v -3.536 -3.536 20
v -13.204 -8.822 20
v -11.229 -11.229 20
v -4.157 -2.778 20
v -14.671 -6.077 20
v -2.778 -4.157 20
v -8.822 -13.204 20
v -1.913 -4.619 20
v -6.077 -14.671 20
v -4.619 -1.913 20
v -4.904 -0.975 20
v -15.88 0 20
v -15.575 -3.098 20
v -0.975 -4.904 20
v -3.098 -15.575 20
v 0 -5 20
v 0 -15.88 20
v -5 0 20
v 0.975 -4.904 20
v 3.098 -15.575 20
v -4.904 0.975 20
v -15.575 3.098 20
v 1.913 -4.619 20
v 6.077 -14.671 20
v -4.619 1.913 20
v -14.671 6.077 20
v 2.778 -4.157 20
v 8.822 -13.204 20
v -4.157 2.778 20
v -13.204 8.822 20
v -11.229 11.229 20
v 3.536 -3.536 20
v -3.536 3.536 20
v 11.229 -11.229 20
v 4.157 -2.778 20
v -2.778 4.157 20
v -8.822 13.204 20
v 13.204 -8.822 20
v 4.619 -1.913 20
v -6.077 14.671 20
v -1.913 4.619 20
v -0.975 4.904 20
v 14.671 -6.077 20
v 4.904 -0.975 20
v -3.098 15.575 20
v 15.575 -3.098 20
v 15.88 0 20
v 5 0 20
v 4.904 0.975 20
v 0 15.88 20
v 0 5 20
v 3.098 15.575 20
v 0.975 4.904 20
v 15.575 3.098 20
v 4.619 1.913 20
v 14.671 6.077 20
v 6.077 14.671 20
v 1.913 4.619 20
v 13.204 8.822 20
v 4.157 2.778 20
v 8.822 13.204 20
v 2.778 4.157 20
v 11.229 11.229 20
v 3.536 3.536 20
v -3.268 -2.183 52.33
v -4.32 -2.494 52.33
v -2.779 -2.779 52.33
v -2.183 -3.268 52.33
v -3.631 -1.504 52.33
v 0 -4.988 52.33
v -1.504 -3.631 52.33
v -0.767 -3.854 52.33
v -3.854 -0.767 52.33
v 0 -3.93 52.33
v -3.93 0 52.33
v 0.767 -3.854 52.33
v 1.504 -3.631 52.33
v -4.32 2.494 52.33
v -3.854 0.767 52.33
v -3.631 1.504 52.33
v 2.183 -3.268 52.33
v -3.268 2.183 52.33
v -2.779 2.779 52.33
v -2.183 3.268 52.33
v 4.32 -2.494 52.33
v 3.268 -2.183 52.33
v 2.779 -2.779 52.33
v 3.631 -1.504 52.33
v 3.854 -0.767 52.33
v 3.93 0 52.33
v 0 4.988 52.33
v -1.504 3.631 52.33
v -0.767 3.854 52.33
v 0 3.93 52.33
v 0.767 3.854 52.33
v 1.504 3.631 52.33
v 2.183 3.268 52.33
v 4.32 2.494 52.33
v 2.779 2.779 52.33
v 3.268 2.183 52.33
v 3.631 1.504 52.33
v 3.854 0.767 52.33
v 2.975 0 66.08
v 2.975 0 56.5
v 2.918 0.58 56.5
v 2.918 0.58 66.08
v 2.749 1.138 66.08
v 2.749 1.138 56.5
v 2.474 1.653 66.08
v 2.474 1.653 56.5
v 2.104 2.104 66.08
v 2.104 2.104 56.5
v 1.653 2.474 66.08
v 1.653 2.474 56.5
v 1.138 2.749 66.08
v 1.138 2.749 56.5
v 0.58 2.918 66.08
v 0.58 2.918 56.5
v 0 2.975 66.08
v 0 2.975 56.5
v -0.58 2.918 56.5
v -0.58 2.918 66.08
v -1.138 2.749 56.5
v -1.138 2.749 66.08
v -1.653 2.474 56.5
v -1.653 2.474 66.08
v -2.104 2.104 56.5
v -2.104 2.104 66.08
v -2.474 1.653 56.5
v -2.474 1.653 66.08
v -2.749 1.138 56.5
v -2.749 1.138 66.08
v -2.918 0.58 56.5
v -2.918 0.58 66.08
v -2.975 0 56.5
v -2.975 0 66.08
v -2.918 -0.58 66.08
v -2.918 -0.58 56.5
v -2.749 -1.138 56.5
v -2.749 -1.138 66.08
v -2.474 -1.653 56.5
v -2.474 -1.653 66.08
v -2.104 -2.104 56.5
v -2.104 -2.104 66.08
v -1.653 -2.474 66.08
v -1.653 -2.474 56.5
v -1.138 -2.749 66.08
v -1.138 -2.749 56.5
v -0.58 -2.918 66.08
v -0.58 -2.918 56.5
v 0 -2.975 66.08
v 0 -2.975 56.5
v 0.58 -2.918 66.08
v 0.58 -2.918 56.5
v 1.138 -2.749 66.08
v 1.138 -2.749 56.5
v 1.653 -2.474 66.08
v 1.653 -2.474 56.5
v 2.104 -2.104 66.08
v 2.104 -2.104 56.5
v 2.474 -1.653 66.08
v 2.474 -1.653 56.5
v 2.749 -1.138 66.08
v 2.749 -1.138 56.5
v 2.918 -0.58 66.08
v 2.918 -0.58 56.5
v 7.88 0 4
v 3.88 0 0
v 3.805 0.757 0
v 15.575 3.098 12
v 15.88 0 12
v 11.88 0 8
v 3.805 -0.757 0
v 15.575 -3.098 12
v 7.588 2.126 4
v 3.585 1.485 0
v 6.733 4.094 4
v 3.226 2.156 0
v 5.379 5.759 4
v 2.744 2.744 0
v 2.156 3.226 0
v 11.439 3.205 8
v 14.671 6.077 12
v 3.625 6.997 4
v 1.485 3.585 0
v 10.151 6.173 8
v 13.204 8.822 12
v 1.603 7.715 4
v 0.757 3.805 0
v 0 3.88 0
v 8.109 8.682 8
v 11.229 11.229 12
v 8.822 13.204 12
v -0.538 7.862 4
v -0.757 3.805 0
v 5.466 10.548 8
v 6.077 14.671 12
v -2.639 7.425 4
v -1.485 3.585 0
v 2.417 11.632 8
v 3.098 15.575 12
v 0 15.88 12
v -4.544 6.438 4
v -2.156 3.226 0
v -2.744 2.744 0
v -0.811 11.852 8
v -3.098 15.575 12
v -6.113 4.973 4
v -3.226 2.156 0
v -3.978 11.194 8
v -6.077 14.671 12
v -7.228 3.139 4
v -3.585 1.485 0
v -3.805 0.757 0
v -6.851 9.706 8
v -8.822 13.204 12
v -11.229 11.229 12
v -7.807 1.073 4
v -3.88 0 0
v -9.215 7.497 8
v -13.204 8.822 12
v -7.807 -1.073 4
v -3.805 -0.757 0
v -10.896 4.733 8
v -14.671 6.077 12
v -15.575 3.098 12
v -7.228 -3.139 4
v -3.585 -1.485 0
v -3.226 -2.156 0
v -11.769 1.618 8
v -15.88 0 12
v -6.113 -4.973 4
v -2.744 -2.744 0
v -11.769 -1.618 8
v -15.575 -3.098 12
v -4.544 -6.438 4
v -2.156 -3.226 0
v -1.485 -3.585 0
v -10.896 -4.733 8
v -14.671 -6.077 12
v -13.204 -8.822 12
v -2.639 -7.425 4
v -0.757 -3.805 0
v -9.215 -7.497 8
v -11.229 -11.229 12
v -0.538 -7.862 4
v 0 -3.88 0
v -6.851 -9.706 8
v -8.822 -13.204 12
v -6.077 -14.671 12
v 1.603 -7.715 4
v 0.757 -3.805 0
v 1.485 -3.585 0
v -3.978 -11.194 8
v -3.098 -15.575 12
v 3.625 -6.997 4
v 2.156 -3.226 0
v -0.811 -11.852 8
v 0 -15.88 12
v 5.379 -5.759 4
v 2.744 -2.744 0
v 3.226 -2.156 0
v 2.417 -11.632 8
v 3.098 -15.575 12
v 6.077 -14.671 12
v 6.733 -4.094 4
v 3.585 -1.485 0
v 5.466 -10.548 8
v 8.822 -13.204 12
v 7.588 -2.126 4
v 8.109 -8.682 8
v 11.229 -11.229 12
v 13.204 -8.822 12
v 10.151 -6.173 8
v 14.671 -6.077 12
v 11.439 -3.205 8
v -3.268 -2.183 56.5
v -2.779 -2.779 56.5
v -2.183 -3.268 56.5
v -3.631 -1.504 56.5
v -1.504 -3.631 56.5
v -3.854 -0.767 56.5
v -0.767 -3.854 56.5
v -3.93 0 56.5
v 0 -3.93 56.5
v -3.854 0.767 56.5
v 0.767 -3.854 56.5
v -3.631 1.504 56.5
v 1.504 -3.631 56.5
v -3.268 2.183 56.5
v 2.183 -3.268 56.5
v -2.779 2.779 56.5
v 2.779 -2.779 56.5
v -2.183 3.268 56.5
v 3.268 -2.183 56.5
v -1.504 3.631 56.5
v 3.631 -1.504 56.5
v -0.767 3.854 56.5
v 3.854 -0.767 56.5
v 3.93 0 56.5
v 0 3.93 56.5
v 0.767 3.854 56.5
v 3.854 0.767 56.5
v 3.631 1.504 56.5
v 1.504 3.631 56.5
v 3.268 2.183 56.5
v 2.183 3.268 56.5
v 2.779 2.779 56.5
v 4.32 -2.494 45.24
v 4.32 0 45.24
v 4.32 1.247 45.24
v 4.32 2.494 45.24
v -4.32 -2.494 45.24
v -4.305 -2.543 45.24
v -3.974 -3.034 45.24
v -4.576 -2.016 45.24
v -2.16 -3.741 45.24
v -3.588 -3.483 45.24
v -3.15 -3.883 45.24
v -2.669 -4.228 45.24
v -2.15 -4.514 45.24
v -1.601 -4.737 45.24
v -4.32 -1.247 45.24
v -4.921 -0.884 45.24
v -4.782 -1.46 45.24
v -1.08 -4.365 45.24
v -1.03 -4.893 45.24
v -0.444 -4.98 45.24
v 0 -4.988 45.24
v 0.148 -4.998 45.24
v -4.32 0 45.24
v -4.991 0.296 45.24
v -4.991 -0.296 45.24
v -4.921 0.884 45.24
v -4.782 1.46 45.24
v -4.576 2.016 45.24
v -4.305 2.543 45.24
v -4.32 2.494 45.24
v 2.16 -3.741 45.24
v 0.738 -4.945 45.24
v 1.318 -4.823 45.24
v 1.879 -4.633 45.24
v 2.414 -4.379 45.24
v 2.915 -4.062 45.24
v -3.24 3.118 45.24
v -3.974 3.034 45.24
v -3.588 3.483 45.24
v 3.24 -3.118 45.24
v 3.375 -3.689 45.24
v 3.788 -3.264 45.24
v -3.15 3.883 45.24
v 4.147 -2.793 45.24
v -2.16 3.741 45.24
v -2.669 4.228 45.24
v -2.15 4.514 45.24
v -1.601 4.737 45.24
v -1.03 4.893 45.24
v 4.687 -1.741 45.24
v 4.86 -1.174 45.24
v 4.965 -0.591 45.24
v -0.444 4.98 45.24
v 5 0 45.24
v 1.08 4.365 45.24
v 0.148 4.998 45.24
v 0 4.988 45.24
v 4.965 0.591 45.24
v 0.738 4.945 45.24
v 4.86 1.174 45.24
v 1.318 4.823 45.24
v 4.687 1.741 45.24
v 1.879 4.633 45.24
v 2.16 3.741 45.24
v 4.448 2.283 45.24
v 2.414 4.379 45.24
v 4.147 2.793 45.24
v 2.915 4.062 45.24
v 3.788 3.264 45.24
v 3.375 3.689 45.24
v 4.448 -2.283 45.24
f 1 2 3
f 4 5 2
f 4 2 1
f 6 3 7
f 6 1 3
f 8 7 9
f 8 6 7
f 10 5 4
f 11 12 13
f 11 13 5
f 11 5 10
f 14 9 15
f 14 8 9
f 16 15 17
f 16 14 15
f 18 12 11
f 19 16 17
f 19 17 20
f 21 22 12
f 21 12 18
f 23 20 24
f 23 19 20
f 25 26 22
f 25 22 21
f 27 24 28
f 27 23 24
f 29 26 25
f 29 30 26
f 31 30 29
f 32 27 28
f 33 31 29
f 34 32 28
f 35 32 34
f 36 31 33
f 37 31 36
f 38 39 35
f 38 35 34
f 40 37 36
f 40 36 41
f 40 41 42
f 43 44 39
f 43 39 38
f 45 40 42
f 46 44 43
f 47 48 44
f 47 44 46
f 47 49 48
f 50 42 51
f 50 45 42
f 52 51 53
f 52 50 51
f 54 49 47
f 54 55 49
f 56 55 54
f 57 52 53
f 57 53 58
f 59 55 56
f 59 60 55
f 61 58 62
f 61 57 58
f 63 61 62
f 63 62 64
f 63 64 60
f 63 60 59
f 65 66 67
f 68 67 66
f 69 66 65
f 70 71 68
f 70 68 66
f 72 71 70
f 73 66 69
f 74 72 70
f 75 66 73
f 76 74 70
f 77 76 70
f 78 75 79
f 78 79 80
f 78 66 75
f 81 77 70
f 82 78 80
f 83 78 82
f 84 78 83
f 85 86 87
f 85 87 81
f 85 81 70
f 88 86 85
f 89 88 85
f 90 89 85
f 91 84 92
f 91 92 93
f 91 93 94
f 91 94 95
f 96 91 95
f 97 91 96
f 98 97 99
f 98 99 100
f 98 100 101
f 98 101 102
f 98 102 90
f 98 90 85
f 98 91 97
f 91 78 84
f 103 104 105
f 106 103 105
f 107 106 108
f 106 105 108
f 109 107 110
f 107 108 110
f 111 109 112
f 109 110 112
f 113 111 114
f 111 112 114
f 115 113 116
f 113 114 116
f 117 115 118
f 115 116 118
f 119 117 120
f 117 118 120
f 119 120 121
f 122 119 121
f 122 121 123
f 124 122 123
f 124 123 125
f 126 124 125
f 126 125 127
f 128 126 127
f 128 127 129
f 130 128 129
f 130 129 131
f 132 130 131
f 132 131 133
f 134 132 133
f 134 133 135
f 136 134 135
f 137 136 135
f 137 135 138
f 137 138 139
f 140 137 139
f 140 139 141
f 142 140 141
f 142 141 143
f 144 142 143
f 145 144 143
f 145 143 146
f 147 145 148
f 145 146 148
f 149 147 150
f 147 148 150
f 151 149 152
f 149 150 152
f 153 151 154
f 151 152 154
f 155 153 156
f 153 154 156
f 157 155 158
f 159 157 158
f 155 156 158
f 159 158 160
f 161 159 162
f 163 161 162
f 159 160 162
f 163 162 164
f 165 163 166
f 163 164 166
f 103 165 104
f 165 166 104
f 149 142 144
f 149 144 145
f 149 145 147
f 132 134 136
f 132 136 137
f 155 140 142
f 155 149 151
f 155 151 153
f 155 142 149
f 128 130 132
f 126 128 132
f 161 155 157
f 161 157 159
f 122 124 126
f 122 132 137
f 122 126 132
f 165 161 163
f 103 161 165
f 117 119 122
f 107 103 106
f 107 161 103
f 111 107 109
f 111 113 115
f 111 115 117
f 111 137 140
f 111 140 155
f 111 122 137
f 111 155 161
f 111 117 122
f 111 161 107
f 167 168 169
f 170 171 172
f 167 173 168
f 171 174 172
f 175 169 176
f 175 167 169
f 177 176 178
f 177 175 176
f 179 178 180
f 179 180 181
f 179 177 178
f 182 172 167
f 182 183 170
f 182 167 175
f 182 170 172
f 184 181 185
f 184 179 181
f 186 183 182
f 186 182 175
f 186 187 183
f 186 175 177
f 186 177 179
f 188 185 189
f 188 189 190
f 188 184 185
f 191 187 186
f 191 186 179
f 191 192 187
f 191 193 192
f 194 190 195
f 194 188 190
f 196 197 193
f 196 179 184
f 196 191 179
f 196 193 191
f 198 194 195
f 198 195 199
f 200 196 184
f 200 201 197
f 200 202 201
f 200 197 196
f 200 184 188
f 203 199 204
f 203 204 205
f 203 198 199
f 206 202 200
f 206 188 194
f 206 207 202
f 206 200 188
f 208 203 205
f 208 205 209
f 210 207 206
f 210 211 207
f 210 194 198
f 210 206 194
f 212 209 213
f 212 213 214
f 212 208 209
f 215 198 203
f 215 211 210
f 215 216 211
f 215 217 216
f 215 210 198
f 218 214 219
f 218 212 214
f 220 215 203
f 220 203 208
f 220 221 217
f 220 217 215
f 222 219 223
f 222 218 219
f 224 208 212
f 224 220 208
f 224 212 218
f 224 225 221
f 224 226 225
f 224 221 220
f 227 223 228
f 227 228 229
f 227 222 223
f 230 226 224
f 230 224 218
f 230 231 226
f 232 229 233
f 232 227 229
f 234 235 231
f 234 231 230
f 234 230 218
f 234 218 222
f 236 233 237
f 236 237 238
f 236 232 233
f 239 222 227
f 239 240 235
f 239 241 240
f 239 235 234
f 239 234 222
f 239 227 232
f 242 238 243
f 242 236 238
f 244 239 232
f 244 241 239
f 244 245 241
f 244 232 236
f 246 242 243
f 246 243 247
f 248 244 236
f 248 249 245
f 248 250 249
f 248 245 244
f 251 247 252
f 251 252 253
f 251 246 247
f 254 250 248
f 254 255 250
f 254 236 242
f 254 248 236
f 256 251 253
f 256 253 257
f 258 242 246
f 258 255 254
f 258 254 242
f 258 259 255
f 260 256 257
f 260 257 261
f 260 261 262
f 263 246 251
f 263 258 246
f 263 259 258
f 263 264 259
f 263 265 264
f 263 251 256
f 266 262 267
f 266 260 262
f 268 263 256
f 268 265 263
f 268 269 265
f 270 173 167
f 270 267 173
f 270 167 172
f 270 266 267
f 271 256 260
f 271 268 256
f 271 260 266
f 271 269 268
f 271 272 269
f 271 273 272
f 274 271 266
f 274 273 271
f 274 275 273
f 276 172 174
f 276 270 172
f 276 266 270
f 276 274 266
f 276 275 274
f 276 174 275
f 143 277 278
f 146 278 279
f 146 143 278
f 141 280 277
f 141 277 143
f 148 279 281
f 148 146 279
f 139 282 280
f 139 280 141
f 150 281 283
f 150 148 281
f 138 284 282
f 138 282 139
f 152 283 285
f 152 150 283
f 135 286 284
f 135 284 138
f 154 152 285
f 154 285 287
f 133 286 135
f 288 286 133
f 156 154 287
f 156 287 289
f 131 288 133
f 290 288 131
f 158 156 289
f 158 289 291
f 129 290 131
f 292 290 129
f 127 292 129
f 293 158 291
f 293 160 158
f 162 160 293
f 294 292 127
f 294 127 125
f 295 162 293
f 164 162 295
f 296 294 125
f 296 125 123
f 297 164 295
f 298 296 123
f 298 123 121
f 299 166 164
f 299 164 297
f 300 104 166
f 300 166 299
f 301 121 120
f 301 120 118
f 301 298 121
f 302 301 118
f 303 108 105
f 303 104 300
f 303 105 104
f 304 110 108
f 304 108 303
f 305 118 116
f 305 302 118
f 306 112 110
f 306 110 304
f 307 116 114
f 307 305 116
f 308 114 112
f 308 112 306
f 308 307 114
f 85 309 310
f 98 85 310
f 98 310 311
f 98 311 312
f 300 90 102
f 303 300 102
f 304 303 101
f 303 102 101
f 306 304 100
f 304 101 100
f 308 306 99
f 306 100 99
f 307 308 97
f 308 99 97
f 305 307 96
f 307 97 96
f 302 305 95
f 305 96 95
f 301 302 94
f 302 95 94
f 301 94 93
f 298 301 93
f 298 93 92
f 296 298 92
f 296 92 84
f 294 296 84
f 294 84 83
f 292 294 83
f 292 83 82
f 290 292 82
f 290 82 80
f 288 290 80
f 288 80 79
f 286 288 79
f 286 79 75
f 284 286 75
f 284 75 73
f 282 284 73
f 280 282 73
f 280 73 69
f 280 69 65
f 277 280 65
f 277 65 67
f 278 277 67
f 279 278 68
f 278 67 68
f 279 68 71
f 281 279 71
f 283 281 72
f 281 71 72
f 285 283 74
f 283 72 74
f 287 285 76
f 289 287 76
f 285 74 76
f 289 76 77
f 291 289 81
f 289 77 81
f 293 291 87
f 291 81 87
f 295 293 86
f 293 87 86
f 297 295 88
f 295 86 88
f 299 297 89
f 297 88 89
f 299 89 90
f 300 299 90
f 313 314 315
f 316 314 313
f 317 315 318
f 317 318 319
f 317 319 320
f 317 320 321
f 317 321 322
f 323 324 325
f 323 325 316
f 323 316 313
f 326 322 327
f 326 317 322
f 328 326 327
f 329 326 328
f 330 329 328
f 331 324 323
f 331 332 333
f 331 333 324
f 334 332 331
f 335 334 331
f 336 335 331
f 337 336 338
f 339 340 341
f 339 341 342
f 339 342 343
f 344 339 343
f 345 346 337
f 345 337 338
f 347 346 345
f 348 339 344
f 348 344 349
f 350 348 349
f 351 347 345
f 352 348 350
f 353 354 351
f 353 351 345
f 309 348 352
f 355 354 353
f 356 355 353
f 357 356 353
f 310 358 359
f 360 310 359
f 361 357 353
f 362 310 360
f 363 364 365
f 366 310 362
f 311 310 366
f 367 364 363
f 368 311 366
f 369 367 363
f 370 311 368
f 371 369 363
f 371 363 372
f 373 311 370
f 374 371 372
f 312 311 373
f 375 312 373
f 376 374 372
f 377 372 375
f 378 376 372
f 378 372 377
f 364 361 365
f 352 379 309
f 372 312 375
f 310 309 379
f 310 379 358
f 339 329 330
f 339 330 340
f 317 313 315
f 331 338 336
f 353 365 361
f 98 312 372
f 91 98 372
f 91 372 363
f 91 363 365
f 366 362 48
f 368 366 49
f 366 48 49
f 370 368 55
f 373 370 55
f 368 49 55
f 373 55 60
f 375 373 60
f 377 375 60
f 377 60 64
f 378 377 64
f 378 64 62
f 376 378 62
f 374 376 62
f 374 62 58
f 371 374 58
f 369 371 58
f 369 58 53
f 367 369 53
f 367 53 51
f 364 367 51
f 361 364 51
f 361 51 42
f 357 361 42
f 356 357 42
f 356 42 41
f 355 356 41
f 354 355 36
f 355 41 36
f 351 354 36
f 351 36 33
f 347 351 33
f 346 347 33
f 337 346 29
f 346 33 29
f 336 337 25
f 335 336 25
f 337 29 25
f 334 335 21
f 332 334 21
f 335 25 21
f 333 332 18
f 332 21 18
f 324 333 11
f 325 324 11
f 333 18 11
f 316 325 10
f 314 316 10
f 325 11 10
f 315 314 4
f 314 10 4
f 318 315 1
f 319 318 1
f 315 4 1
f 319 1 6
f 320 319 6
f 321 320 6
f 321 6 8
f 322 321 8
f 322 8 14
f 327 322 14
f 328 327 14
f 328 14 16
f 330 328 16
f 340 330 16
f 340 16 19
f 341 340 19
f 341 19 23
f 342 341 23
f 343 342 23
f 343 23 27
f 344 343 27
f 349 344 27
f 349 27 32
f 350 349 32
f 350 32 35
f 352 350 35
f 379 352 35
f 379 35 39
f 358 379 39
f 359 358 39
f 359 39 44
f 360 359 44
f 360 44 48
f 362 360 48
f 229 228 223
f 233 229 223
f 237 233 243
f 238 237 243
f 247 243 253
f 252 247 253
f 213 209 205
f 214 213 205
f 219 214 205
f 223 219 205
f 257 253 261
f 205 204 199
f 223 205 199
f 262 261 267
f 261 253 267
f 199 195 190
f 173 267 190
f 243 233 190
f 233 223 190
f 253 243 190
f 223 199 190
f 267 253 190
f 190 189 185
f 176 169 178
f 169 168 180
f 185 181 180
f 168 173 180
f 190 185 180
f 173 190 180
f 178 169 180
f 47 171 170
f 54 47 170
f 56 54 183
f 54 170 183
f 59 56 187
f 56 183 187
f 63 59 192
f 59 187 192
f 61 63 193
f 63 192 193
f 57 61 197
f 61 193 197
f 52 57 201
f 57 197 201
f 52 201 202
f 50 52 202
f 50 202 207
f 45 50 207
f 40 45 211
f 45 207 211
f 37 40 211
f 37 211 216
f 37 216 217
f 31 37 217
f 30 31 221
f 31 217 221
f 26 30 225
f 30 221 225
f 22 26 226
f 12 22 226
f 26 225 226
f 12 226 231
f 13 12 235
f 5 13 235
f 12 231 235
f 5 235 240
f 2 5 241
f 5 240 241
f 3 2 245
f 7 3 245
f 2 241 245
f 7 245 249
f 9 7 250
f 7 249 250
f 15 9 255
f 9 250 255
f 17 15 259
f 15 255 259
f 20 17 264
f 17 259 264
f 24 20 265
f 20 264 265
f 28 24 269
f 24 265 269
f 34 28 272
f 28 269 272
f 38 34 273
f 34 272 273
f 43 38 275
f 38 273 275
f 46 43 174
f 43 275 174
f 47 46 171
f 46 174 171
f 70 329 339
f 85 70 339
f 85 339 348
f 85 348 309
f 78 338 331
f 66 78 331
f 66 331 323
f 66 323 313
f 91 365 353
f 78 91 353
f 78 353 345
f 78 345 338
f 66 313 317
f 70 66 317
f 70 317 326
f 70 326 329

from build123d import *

# Parameters (mm, degrees)
F0_R     = 15.88
F0_R_2   = 10.66
F0_R_3   = 5
F0_R_4   = 3.93
F0_R_5   = 2.975
F1_DEPTH = 20
F2_DEPTH = 45.24
F3_DEPTH = 52.33
F4_DEPTH = 56.5
F5_DEPTH = 66.08
F7_SIZE  = 12


# Not quite as in the source:
# - a feature names something its author has since deleted; it is built from what else it names


with BuildPart() as f1:
    # F0 (on Top) → F1 (new body)
    with BuildSketch(Plane.XY):
        Circle(F0_R)
        Circle(F0_R_2, mode=Mode.SUBTRACT)
        Circle(F0_R_2)
        Circle(F0_R_3, mode=Mode.SUBTRACT)
        Circle(F0_R_3)
        Polygon((0, 4.9883063258), (4.32, 2.4941531629), (4.32, -2.4941531629), (0, -4.9883063258), (-4.32, -2.4941531629), (-4.32, 2.4941531629), align=None, mode=Mode.SUBTRACT)
        Polygon((4.32, -2.4941531629), (4.32, 2.4941531629), (0, 4.9883063258), (-4.32, 2.4941531629), (-4.32, -2.4941531629), (0, -4.9883063258), align=None)
        Circle(F0_R_4, mode=Mode.SUBTRACT)
        Circle(F0_R_4)
        Circle(F0_R_5, mode=Mode.SUBTRACT)
        Circle(F0_R_5)
    extrude(amount=F1_DEPTH)

    # F0 (on Top) → F2 (join)
    with BuildSketch(Plane.XY):
        Circle(F0_R_3)
        Polygon((0, 4.9883063258), (4.32, 2.4941531629), (4.32, -2.4941531629), (0, -4.9883063258), (-4.32, -2.4941531629), (-4.32, 2.4941531629), align=None, mode=Mode.SUBTRACT)
        Polygon((4.32, -2.4941531629), (4.32, 2.4941531629), (0, 4.9883063258), (-4.32, 2.4941531629), (-4.32, -2.4941531629), (0, -4.9883063258), align=None)
        Circle(F0_R_4, mode=Mode.SUBTRACT)
        Circle(F0_R_4)
        Circle(F0_R_5, mode=Mode.SUBTRACT)
        Circle(F0_R_5)
    extrude(amount=F2_DEPTH)

    # F0 (on Top) → F3 (join)
    with BuildSketch(Plane.XY):
        Polygon((4.32, -2.4941531629), (4.32, 2.4941531629), (0, 4.9883063258), (-4.32, 2.4941531629), (-4.32, -2.4941531629), (0, -4.9883063258), align=None)
        Circle(F0_R_4, mode=Mode.SUBTRACT)
        Circle(F0_R_4)
        Circle(F0_R_5, mode=Mode.SUBTRACT)
        Circle(F0_R_5)
    extrude(amount=F3_DEPTH)

    # F0 (on Top) → F4 (join)
    with BuildSketch(Plane.XY):
        Circle(F0_R_4)
        Circle(F0_R_5, mode=Mode.SUBTRACT)
        Circle(F0_R_5)
    extrude(amount=F4_DEPTH)

    # F0 (on Top) → F5 (join)
    with BuildSketch(Plane.XY):
        Circle(F0_R_5)
    extrude(amount=F5_DEPTH)

    # F7
    f7_edges = [f1.edges().sort_by_distance(p)[0] for p in [
        (-15.88, 0, 0),
    ]]
    chamfer(f7_edges, length=F7_SIZE)


solid = f1.part
